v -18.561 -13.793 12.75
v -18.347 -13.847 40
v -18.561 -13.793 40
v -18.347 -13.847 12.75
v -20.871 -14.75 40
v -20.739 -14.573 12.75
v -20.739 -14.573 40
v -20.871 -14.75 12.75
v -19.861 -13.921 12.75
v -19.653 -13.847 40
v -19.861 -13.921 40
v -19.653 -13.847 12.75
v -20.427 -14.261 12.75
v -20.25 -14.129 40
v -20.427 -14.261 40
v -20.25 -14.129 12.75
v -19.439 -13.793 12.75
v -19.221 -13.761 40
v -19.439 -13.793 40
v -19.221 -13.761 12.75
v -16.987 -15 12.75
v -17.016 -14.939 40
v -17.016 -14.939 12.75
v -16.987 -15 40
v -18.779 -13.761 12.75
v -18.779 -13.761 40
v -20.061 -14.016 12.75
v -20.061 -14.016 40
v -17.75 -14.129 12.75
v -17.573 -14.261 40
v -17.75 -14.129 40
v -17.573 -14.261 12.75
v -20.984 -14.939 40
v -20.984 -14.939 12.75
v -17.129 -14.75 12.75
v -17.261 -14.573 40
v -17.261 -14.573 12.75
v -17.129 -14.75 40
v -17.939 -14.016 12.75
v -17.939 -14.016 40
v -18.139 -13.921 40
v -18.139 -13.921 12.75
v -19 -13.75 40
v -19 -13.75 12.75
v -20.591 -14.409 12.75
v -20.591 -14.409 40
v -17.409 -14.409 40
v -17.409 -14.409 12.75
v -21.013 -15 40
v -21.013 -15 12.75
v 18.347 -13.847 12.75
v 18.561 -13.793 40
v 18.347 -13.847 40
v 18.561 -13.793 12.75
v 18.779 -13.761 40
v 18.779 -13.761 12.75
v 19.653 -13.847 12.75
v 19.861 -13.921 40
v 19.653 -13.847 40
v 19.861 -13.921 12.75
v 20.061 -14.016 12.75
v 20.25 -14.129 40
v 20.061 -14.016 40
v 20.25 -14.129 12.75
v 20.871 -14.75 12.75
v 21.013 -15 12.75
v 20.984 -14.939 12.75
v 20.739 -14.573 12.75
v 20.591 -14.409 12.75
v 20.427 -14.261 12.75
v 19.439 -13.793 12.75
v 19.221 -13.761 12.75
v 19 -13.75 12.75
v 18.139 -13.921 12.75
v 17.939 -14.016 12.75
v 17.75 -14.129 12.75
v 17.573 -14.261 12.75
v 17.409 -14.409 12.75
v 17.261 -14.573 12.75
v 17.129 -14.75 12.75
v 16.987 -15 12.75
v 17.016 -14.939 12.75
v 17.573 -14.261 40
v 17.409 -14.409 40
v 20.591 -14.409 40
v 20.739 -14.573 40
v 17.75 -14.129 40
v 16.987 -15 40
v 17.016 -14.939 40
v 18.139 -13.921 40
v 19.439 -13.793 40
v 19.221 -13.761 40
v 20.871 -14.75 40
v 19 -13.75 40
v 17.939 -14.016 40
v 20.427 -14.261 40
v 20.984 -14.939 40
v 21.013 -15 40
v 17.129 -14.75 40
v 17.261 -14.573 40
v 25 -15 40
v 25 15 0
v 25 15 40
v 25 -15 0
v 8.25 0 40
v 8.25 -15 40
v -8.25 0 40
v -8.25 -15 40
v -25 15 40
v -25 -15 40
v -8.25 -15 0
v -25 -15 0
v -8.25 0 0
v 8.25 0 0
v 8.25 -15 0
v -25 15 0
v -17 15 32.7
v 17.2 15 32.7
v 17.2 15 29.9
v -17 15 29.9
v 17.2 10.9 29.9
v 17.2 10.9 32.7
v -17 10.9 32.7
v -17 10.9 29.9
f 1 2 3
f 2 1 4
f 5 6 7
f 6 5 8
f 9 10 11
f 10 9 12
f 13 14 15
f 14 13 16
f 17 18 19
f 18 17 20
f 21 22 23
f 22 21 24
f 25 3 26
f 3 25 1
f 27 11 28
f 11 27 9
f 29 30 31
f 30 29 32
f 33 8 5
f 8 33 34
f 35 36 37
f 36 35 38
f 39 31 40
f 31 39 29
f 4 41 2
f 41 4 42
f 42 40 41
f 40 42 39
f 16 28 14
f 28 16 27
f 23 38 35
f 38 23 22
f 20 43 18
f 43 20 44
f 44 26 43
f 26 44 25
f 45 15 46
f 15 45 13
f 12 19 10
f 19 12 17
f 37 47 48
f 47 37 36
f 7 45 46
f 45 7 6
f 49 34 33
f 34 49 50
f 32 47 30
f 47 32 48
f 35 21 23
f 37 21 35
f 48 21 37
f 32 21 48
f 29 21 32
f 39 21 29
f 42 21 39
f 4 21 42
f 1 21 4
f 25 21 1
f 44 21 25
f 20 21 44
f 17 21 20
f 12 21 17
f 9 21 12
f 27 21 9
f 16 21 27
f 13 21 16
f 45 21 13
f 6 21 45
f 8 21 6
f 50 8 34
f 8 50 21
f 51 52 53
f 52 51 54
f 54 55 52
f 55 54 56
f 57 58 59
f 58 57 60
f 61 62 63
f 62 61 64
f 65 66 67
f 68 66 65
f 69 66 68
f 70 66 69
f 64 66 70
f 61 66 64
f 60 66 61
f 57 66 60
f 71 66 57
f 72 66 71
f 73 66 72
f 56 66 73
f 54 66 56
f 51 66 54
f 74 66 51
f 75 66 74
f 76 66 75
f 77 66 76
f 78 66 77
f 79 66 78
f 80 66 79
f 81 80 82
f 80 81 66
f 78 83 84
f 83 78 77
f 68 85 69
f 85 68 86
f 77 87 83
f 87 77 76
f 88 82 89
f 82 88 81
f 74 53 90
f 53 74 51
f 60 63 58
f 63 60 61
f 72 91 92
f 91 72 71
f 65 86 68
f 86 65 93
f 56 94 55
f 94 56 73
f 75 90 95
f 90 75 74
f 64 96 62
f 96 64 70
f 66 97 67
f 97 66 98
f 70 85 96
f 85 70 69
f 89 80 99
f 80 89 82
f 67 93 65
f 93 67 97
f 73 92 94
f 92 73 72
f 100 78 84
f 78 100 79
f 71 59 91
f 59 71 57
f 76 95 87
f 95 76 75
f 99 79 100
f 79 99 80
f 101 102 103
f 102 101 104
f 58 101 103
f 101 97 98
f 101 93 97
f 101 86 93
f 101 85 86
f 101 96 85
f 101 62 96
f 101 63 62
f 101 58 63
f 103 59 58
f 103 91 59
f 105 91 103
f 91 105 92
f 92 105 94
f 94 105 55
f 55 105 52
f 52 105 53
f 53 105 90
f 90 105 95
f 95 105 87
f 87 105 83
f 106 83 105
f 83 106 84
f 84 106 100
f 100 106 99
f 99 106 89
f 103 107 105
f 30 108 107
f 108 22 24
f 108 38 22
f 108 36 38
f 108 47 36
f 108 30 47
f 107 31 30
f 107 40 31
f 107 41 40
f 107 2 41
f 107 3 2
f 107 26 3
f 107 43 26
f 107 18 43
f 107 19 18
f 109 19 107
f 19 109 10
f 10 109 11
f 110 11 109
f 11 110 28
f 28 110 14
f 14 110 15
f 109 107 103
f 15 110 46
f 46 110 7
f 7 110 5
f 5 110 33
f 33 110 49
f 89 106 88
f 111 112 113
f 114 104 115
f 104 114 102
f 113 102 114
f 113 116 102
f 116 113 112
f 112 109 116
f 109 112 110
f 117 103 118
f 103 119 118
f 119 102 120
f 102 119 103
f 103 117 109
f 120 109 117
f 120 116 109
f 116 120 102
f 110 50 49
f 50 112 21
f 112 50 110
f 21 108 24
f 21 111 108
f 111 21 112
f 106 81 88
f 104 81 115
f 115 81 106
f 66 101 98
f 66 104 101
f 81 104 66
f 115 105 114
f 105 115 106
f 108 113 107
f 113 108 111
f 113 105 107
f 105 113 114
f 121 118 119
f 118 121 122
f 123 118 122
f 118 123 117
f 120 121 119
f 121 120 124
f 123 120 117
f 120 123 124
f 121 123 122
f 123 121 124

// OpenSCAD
// Wall-mounted 10 mL Syringe Holder
// Designed for FDM 3D printing

// --- Dimensions (measured with calipers) ---
block_w = 50;   // Width (X)
block_d = 30;   // Depth (Y)
block_h = 40;   // Height (Z)

// Barrel channel
barrel_dia = 16;      // Syringe barrel diameter
channel_w = 16.5;     // Channel width (clearance)
channel_r = channel_w / 2; // Radius of the semi-circular back

// Flange slot
flange_w = 34;        // Slot width (X)
flange_h = 2.6;       // Slot height (Z)
flange_z_start = 30;  // Bottom of slot
flange_y_end = 11;    // Depth of slot from front (y = -15)

// Wall screws
screw_dia = 4.5;      // Hole diameter for M4 screws
screw_x = 19;         // X position of screw holes
screw_z = 15;         // Z position of screw holes

// --- Settings ---
$fn = 64; // High resolution for round holes

// --- Main Block ---
// Centered at origin: X [-25, 25], Y [-15, 15], Z [0, 40]
difference() {
    // Solid block
    translate([-block_w/2, -block_d/2, 0])
        cube([block_w, block_d, block_h]);

    // --- Barrel Channel ---
    // The channel is defined by a cross-section in the XY plane, extruded along Z.
    // Cross-section:
    // 1. Semi-circle centered at (0,0) with radius channel_r, facing +Y (towards wall).
    //    This covers Y from 0 to channel_r.
    // 2. Rectangular slot from Y=0 to Y=-15 (front face), width channel_w.
    
    // We create the cross-section using 2D operations and extrude it.
    linear_extrude(height = block_h + 1, center = false)
    union() {
        // Semi-circle part (Y >= 0)
        intersection() {
            circle(r = channel_r);
            square([-channel_r, 0], center = false); // Keeps only Y >= 0 part of the circle
        }
        // Rectangular part (Y < 0)
        translate([-channel_r, -block_d/2])
            square([channel_w, block_d/2]);
    }

    // --- Flange Slot ---
    // Cut from front face (y = -15) back to y = 11.
    // Width 34mm (X: -17 to 17), Height 2.6mm (Z: 30 to 32.6).
    // Extend slightly past boundaries to ensure clean cut.
    translate([-flange_w/2, flange_y_end - 0.1, flange_z_start - 0.1])
        cube([flange_w + 0.2, block_d/2 - flange_y_end + 0.2, flange_h + 0.2]);

    // --- Wall Screw Holes ---
    // Two holes, diameter 4.5mm, at x = -19 and 19, z = 15.
    // Running through the block along Y (from front to back).
    for (x_pos = [-screw_x, screw_x]) {
        translate([x_pos, -block_d/2 - 1, screw_z - screw_dia/2])
            cylinder(r = screw_dia/2, h = block_d + 2, center = false);
    }
}
